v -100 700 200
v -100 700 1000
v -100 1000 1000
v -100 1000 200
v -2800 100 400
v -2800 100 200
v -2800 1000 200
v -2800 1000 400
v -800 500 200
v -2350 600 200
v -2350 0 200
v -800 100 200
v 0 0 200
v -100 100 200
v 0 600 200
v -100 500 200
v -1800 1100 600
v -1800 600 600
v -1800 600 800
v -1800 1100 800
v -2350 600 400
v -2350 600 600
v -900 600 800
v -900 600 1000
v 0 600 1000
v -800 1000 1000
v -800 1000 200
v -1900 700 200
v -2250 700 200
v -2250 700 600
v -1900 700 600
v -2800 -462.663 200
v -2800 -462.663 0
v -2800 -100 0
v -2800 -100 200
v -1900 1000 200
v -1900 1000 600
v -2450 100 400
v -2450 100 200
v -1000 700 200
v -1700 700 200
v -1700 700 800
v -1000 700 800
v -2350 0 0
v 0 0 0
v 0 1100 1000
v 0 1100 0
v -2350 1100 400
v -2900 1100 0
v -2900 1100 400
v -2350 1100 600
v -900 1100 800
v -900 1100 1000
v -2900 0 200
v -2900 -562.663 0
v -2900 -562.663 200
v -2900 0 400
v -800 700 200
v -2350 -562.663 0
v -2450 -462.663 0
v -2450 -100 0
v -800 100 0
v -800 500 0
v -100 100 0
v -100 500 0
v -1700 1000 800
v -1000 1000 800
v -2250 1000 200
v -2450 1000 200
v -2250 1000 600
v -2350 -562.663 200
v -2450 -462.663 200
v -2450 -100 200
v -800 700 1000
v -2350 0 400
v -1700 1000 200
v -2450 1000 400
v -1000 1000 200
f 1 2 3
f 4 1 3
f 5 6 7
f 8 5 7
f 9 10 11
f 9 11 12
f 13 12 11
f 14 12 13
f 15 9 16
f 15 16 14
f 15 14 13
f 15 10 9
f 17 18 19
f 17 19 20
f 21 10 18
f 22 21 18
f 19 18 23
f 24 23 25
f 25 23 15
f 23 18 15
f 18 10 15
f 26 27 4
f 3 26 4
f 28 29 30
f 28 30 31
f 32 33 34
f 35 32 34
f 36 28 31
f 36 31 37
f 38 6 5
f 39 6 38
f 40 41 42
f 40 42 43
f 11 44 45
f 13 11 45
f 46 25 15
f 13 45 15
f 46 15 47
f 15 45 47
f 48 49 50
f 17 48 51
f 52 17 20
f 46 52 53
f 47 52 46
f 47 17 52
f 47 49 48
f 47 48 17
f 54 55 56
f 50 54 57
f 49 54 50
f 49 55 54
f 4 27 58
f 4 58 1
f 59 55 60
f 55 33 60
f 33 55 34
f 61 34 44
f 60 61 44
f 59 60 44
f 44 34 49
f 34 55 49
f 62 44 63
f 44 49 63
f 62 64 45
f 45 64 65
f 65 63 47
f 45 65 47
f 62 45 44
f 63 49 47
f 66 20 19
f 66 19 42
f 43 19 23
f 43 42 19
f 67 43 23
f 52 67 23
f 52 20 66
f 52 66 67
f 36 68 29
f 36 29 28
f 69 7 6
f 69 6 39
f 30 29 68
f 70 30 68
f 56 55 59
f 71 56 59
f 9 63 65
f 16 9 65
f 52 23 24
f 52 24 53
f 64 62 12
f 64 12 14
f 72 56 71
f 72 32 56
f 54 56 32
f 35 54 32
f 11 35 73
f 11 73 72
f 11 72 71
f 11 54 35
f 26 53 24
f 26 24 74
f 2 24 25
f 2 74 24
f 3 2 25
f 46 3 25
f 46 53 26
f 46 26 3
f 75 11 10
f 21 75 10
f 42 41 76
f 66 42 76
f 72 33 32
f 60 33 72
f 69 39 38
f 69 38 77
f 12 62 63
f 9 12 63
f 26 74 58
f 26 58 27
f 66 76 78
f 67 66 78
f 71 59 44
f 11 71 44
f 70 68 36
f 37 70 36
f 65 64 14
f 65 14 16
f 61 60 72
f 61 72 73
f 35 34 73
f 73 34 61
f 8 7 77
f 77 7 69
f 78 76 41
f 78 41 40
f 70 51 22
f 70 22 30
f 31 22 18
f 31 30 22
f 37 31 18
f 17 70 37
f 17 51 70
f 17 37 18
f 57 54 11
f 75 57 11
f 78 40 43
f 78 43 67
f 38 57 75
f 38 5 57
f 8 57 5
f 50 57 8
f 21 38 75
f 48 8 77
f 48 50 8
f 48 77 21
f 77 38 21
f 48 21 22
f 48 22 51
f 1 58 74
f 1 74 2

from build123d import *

# Parameters (mm, degrees)
F0_W     = 350
F0_H     = 362.663257
F0_W_2   = 700
F0_H_2   = 400
F1_DEPTH = 200
F2_W     = 900
F2_H     = 500
F2_W_2   = 700
F2_H_2   = 300
F3_DEPTH = 800
F4_W     = 900
F4_H     = 500
F4_W_2   = 700
F4_H_2   = 300
F5_DEPTH = 600
F6_W     = 550
F6_H     = 500
F6_W_2   = 350
F6_H_2   = 300
F7_DEPTH = 400
F8_W     = 550
F8_H     = 1100
F8_W_2   = 350
F8_H_2   = 900
F9_DEPTH = 200


with BuildPart() as f1:
    # F0 (on Top) → F1 (new body)
    with BuildSketch(Plane.XY):
        Polygon((-2350, 0), (0, 0), (0, 1100), (-2900, 1100), (-2900, 0), (-2900, -562.663257), (-2350, -562.663257), align=None)
        with Locations((-2625, -281.331628)):
            Rectangle(F0_W, F0_H, mode=Mode.SUBTRACT)
        with Locations((-450, 300)):
            Rectangle(F0_W_2, F0_H_2, mode=Mode.SUBTRACT)
    extrude(amount=F1_DEPTH)

    # F2 (on face) → F3 (join)
    with BuildSketch(Plane.XY.offset(200)):
        with Locations((-450, 850)):
            Rectangle(F2_W, F2_H)
        with Locations((-450, 850)):
            Rectangle(F2_W_2, F2_H_2, mode=Mode.SUBTRACT)
    extrude(amount=F3_DEPTH)

    # F4 (on face) → F5 (join)
    with BuildSketch(Plane.XY.offset(200)):
        with Locations((-1350, 850)):
            Rectangle(F4_W, F4_H)
        with Locations((-1350, 850)):
            Rectangle(F4_W_2, F4_H_2, mode=Mode.SUBTRACT)
    extrude(amount=F5_DEPTH)

    # F6 (on face) → F7 (join)
    with BuildSketch(Plane.XY.offset(200)):
        with Locations((-2075, 850)):
            Rectangle(F6_W, F6_H)
        with Locations((-2075, 850)):
            Rectangle(F6_W_2, F6_H_2, mode=Mode.SUBTRACT)
    extrude(amount=F7_DEPTH)

    # F8 (on face) → F9 (join)
    with BuildSketch(Plane.XY.offset(200)):
        with Locations((-2625, 550)):
            Rectangle(F8_W, F8_H)
        with Locations((-2625, 550)):
            Rectangle(F8_W_2, F8_H_2, mode=Mode.SUBTRACT)
    extrude(amount=F9_DEPTH)


solid = f1.part
